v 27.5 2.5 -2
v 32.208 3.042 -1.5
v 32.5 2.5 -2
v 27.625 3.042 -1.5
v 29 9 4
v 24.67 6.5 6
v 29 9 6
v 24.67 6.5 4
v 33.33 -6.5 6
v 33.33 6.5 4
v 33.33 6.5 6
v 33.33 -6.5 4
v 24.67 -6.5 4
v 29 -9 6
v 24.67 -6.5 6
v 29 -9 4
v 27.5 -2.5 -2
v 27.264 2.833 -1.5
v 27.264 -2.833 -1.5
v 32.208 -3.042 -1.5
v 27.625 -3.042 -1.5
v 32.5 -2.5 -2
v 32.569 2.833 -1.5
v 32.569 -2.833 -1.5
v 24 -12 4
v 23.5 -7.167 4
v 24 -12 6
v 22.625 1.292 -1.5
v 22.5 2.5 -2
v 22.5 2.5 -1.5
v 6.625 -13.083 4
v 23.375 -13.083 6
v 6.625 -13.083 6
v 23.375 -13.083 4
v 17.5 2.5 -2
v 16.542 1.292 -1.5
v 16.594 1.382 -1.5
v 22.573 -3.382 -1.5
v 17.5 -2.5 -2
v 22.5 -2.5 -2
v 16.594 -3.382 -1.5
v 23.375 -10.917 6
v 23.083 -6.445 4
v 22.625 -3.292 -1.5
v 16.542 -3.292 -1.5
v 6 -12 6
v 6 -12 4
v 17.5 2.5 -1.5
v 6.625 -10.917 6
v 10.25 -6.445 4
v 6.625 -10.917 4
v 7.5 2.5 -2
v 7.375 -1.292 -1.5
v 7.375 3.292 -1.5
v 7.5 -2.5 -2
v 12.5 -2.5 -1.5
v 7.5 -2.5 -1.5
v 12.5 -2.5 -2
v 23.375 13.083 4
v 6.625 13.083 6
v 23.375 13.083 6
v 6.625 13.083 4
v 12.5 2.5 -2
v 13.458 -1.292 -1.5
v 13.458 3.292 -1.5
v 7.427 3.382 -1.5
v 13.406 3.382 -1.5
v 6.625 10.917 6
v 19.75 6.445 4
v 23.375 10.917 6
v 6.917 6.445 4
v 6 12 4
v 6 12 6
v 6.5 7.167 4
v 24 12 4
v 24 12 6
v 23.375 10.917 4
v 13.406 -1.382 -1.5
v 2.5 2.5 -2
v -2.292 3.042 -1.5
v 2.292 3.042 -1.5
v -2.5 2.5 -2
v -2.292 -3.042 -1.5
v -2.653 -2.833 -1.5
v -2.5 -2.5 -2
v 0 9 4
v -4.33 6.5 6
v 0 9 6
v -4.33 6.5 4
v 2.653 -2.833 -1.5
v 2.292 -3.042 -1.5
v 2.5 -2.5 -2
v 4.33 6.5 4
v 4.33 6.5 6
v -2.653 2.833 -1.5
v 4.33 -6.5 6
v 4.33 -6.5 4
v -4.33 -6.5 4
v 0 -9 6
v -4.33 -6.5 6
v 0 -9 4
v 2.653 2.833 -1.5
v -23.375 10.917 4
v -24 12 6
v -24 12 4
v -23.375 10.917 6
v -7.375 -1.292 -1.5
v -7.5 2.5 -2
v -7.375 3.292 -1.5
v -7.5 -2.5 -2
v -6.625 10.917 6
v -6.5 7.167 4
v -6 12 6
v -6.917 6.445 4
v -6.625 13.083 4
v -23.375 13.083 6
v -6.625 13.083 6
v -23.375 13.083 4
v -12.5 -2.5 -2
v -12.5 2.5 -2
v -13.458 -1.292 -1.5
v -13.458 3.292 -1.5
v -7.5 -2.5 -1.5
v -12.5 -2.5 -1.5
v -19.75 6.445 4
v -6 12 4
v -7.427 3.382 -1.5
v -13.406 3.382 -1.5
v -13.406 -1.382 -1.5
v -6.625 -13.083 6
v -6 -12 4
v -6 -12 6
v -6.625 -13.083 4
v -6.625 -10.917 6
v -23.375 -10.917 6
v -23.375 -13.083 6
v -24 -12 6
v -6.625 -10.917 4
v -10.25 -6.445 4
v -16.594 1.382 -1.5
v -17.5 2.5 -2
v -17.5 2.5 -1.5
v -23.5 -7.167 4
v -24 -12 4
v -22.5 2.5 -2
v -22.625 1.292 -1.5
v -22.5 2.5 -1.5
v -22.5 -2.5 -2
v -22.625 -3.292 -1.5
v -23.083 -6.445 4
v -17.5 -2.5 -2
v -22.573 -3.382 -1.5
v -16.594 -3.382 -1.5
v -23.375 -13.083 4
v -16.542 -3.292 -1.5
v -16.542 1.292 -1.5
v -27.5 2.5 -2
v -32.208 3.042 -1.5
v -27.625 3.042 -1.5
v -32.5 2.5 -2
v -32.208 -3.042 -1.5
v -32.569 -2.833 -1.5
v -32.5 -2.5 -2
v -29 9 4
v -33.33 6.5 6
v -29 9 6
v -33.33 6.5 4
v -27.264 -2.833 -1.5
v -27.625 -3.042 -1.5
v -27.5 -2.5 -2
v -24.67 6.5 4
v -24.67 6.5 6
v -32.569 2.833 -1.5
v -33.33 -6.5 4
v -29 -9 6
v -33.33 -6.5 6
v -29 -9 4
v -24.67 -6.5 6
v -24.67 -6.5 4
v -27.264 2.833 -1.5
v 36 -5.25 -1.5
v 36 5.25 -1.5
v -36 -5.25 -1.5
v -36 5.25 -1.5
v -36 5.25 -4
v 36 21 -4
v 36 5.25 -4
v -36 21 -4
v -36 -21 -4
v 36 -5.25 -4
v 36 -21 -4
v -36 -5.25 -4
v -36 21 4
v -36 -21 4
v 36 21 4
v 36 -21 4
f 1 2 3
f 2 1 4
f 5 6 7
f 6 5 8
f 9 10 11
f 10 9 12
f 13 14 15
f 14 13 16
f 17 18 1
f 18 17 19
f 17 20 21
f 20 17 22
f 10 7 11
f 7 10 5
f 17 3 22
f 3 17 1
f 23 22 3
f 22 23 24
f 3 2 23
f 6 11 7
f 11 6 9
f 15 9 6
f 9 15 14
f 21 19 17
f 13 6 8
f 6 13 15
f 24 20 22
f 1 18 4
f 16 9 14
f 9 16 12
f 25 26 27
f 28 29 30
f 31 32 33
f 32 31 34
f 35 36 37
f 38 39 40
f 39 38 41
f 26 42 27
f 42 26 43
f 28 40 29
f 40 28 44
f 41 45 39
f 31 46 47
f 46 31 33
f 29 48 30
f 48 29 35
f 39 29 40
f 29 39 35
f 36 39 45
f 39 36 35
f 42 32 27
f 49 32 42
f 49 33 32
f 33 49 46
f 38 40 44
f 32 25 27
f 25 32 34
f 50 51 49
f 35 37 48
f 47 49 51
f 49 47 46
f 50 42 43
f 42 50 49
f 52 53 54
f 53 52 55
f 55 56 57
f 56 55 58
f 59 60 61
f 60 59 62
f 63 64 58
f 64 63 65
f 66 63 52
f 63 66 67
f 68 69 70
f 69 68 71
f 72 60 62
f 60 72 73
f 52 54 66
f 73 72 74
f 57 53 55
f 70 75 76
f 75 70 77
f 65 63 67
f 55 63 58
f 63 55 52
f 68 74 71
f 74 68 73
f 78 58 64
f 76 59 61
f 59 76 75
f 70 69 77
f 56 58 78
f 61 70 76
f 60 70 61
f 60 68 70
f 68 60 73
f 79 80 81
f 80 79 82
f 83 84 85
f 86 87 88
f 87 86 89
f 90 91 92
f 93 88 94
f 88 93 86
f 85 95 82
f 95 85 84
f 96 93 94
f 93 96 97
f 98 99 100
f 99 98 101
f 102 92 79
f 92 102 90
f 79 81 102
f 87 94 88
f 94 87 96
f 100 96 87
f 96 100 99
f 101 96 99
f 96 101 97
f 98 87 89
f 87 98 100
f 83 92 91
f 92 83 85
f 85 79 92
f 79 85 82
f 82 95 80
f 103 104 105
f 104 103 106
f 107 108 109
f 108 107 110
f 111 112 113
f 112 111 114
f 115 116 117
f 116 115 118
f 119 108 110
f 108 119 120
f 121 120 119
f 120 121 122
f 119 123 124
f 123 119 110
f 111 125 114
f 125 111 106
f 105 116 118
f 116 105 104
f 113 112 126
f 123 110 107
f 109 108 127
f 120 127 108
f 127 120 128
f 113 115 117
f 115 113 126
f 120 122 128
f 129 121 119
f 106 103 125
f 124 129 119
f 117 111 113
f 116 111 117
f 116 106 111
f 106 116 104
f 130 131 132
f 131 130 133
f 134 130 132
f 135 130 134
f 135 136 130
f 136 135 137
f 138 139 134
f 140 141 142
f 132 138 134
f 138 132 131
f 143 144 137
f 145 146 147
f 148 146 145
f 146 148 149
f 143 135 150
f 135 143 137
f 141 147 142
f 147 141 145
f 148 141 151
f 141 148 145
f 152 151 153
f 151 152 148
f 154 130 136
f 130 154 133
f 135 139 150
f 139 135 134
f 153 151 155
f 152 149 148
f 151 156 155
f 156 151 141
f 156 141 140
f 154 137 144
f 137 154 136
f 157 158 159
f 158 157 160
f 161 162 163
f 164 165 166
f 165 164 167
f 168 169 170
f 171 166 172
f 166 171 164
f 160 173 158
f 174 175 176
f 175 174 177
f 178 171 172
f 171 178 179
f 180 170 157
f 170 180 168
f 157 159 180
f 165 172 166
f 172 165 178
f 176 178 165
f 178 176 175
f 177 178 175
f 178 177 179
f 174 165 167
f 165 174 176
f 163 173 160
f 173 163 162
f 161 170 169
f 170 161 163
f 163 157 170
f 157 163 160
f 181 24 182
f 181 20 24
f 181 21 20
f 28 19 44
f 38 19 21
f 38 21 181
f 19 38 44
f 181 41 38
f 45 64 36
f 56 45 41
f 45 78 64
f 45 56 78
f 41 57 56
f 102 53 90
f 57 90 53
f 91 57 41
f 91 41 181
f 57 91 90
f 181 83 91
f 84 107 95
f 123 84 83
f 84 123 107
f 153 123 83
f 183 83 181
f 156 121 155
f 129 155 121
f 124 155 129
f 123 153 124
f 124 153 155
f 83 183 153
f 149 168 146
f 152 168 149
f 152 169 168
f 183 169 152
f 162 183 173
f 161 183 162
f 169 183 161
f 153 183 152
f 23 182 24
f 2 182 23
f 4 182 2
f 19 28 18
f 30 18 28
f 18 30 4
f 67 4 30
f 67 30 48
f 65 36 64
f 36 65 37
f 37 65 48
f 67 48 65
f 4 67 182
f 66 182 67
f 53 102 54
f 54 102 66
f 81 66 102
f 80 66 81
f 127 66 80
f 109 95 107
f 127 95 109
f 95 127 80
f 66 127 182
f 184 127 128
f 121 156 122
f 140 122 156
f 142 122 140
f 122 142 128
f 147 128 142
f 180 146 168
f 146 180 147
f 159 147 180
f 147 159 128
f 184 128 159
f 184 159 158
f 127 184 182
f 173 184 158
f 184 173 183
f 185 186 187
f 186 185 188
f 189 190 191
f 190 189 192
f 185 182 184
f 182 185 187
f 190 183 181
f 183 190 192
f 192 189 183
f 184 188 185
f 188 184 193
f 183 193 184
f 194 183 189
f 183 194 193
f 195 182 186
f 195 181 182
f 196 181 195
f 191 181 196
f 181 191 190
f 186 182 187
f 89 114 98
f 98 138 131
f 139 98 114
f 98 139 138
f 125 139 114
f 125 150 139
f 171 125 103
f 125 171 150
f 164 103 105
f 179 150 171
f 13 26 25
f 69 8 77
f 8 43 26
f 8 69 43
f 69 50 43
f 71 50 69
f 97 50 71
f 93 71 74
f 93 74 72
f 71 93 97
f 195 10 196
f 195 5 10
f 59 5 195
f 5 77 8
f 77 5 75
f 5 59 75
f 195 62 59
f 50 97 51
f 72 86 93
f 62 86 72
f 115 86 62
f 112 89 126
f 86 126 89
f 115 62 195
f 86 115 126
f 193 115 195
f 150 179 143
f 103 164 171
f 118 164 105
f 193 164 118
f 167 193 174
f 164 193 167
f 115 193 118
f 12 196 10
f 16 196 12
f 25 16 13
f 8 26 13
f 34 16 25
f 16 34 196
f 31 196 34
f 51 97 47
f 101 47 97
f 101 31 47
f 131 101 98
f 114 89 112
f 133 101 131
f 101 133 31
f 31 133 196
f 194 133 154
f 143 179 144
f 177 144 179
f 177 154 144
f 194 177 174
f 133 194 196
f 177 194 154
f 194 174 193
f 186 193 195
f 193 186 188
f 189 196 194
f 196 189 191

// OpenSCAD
// WS2812 LED Strip Parameters - verified measurements
led_spacing = 10;      // 10mm between LED centers
strip_width = 10;      // 10mm wide LED strip
strip_height = 2;      // Keep same
tolerance = 0.5;       // Keep same
led_size = 5;         // 5mm square LED cutouts

// Updated Base Parameters
base_width = 72;      // Optimized smaller base
base_length = 42;     // Adjusted proportionally
base_height = 8;     // Increased by 25% from 25mm
wire_channel_length = 10;

// Updated Light pipe parameters
cavity_width_bottom = 3;  
cavity_width_top = 8;    // Increased for better light spread
path_separation = 10;      

// Updated 7-Segment Display Parameters
segment_h_length = 18;    // Increased horizontal length for wider number
segment_v_length = 22;    // Kept reduced vertical length
segment_width = 10;        // Keep wider segments
segment_depth = 0;       // Keep same
segment_spacing = 0;      // Keep tight spacing
x_offset = 16;           // Increased horizontal spread

// Add diffuser parameters
diffuser_height = .6;

// Define LED positions globally
y_offset = -strip_width/4;
led1 = [0, -3.0 * led_spacing + y_offset];  // LED1
led2 = [0,-2.0 * led_spacing + y_offset];  // LED2
led3 = [0,-1.0 * led_spacing + y_offset];  // LED3
led4 = [0,0.0 * led_spacing + y_offset];   // LED4 - Center LED
led5 = [0,1.0 * led_spacing + y_offset];   // LED5
led6 = [0,2.0 * led_spacing + y_offset];   // LED6
led7 = [0,3.0 * led_spacing + y_offset];   // LED7

// Define segment positions globally - Wide and squished
seg_f = [-12, 15];     // F (top left vertical) - moved outward
seg_e = [-12, -15];    // E (bottom left vertical) - moved outward
seg_a = [0, 29];      // A (top horizontal) - same height
seg_g = [0, 0];       // G (middle horizontal) - unchanged
seg_b = [12, 15];      // B (top right vertical) - moved closer
seg_c = [12, -15];     // C (bottom right vertical) - moved closer
seg_d = [0, -29];     // D (bottom horizontal) - moved closer

// LED Strip Channel with wire channels - centered
module led_channel() {
        // Main channel exactly 10mm wide plus tolerance
        translate([-base_width/2 + wire_channel_length, -strip_width/2 - tolerance/2, -base_height/2])
            cube([base_width - 2*wire_channel_length, strip_width + tolerance, strip_height + tolerance]);
        
        // Wire channels same width
        translate([-base_width/2, -strip_width/2 - tolerance/2, -base_height/2])
            cube([wire_channel_length, strip_width + tolerance, strip_height + tolerance]);
        translate([base_width/2 - wire_channel_length, -strip_width/2 - tolerance/2, -base_height/2])
            cube([wire_channel_length, strip_width + tolerance, strip_height + tolerance]);
    
}

// Single light pipe cavity with elongating shape
module light_cavity(led_pos, segment_pos, is_horizontal=false) {
    // Calculate heights for better progression
    z_bottom = -base_height/2 + strip_height;
    z_top = base_height/2 - segment_depth;
    total_height = z_top - z_bottom;
    
    hull() {
        // Bottom (at LED) - small square
        translate([led_pos[0] - led_size/2, led_pos[1], z_bottom])
            cube([led_size, led_size, 2]);
     
            
        // Top (at segment) - full segment shape
        translate([segment_pos[0], segment_pos[1], z_top]) {
            rotate([0, 0, is_horizontal ? 0 : 90])
                linear_extrude(height=2)
                    segment(segment_h_length, is_horizontal ? segment_width : segment_width/4);
        }
    }
    
}

// All light cavities with corrected segment positions and mirroring
module all_cavities(visualization=false) {
    color_alpha = visualization ? ["Red", 0.8] : ["Gold", 1];
    
    color(color_alpha[0], color_alpha[1])
    rotate([0, 0, 90]) {
        y_offset = -strip_width/4;
        
        // Light paths
        light_cavity(led1, seg_d, true);   // LED1 → F (vertical)

        light_cavity(led2, seg_e, false);   // LED2 → E (vertical)
        light_cavity(led3, seg_c, false);    // LED3 → A (horizontal)

        light_cavity(led4, seg_g, true);    // LED4 → G (horizontal)

        light_cavity(led5, seg_b, false);   // LED5 → B (vertical)
        light_cavity(led6, seg_f, false);   // LED6 → C (vertical)

        light_cavity(led7, seg_a, true);    // LED6 → D (horizontal)
    }
}

// Base with LED channel, cavities, 
module base() {
    difference() {
        union() {
            // Main block
            cube([base_width, base_length, base_height], center=true);
                        
        }
        
        // LED channel with wire channels
        led_channel();
        // Light pipe cavities
        all_cavities(false);  // Use same paths for actual cavities
        
        // Ensure cavities connect to segments
        translate([0, 0, base_height/2 - segment_depth])
            linear_extrude(height=segment_depth + 1)
                seven_segments();
    }
}

module segment(length, width) {
    // Elongated hexagonal shape
    hull() {
        translate([-length/2 + width/2, 0, 0]) 
            circle(d=width, $fn=6);
        translate([length/2 - width/2, 0, 0])  
            circle(d=width, $fn=6);
    }
}

module seven_segments() {
    rotate([0, 0, 90])  // Rotate the entire segment layout 90°
    union() {
        // A (now right horizontal)
        translate([0, segment_v_length + segment_spacing*2, 0]) 
            segment(segment_h_length, segment_width);
        
        // B,F (now top and bottom verticals on right side)
        translate([x_offset, segment_v_length/2 + segment_spacing, 0]) 
            rotate([0,0,90]) 
                segment(segment_v_length, segment_width);  // B
        translate([-x_offset, segment_v_length/2 + segment_spacing, 0]) 
            rotate([0,0,90]) 
                segment(segment_v_length, segment_width);  // F
        
        // G (middle horizontal, now vertical)
        translate([0, 0, 0])
            segment(segment_h_length, segment_width);
        
        // C,E (bottom verticals, now left side horizontals)
        translate([x_offset, -segment_v_length/2 - segment_spacing, 0]) 
            rotate([0,0,90]) 
                segment(segment_v_length, segment_width);  // C
        translate([-x_offset, -segment_v_length/2 - segment_spacing, 0]) 
            rotate([0,0,90]) 
                segment(segment_v_length, segment_width);  // E
        
        // D (now left horizontal)
        translate([0, -segment_v_length - segment_spacing*2, 0]) 
            segment(segment_h_length, segment_width);
    }
}

// Top layer with segment cavities
module segment_layer() {
    color("SteelBlue")
    difference() {
        // Main plate - extended to match base
        translate([0, 0, base_height/2])
            cube([base_width, base_length, segment_depth], center=true);
        
        // Individual segment cavities
        translate([0, 0, base_height/2 - segment_depth/2])
            linear_extrude(height=segment_depth + 1)
                seven_segments();
    }
}

// Diffuser layer module
module diffuser_layer() {
    color("White", alpha=0.2)  // Semi-transparent to visualize
    translate([0, 0, base_height/2])  // Changed to sit directly on base
        cube([base_width, base_length, diffuser_height], center=true);
}

// Render just the paths in red with slight transparency
all_cavities(true);  // Show paths
color("Green", alpha=0.9)
union() {
   base();
   
//   diffuser_layer();
}
   
